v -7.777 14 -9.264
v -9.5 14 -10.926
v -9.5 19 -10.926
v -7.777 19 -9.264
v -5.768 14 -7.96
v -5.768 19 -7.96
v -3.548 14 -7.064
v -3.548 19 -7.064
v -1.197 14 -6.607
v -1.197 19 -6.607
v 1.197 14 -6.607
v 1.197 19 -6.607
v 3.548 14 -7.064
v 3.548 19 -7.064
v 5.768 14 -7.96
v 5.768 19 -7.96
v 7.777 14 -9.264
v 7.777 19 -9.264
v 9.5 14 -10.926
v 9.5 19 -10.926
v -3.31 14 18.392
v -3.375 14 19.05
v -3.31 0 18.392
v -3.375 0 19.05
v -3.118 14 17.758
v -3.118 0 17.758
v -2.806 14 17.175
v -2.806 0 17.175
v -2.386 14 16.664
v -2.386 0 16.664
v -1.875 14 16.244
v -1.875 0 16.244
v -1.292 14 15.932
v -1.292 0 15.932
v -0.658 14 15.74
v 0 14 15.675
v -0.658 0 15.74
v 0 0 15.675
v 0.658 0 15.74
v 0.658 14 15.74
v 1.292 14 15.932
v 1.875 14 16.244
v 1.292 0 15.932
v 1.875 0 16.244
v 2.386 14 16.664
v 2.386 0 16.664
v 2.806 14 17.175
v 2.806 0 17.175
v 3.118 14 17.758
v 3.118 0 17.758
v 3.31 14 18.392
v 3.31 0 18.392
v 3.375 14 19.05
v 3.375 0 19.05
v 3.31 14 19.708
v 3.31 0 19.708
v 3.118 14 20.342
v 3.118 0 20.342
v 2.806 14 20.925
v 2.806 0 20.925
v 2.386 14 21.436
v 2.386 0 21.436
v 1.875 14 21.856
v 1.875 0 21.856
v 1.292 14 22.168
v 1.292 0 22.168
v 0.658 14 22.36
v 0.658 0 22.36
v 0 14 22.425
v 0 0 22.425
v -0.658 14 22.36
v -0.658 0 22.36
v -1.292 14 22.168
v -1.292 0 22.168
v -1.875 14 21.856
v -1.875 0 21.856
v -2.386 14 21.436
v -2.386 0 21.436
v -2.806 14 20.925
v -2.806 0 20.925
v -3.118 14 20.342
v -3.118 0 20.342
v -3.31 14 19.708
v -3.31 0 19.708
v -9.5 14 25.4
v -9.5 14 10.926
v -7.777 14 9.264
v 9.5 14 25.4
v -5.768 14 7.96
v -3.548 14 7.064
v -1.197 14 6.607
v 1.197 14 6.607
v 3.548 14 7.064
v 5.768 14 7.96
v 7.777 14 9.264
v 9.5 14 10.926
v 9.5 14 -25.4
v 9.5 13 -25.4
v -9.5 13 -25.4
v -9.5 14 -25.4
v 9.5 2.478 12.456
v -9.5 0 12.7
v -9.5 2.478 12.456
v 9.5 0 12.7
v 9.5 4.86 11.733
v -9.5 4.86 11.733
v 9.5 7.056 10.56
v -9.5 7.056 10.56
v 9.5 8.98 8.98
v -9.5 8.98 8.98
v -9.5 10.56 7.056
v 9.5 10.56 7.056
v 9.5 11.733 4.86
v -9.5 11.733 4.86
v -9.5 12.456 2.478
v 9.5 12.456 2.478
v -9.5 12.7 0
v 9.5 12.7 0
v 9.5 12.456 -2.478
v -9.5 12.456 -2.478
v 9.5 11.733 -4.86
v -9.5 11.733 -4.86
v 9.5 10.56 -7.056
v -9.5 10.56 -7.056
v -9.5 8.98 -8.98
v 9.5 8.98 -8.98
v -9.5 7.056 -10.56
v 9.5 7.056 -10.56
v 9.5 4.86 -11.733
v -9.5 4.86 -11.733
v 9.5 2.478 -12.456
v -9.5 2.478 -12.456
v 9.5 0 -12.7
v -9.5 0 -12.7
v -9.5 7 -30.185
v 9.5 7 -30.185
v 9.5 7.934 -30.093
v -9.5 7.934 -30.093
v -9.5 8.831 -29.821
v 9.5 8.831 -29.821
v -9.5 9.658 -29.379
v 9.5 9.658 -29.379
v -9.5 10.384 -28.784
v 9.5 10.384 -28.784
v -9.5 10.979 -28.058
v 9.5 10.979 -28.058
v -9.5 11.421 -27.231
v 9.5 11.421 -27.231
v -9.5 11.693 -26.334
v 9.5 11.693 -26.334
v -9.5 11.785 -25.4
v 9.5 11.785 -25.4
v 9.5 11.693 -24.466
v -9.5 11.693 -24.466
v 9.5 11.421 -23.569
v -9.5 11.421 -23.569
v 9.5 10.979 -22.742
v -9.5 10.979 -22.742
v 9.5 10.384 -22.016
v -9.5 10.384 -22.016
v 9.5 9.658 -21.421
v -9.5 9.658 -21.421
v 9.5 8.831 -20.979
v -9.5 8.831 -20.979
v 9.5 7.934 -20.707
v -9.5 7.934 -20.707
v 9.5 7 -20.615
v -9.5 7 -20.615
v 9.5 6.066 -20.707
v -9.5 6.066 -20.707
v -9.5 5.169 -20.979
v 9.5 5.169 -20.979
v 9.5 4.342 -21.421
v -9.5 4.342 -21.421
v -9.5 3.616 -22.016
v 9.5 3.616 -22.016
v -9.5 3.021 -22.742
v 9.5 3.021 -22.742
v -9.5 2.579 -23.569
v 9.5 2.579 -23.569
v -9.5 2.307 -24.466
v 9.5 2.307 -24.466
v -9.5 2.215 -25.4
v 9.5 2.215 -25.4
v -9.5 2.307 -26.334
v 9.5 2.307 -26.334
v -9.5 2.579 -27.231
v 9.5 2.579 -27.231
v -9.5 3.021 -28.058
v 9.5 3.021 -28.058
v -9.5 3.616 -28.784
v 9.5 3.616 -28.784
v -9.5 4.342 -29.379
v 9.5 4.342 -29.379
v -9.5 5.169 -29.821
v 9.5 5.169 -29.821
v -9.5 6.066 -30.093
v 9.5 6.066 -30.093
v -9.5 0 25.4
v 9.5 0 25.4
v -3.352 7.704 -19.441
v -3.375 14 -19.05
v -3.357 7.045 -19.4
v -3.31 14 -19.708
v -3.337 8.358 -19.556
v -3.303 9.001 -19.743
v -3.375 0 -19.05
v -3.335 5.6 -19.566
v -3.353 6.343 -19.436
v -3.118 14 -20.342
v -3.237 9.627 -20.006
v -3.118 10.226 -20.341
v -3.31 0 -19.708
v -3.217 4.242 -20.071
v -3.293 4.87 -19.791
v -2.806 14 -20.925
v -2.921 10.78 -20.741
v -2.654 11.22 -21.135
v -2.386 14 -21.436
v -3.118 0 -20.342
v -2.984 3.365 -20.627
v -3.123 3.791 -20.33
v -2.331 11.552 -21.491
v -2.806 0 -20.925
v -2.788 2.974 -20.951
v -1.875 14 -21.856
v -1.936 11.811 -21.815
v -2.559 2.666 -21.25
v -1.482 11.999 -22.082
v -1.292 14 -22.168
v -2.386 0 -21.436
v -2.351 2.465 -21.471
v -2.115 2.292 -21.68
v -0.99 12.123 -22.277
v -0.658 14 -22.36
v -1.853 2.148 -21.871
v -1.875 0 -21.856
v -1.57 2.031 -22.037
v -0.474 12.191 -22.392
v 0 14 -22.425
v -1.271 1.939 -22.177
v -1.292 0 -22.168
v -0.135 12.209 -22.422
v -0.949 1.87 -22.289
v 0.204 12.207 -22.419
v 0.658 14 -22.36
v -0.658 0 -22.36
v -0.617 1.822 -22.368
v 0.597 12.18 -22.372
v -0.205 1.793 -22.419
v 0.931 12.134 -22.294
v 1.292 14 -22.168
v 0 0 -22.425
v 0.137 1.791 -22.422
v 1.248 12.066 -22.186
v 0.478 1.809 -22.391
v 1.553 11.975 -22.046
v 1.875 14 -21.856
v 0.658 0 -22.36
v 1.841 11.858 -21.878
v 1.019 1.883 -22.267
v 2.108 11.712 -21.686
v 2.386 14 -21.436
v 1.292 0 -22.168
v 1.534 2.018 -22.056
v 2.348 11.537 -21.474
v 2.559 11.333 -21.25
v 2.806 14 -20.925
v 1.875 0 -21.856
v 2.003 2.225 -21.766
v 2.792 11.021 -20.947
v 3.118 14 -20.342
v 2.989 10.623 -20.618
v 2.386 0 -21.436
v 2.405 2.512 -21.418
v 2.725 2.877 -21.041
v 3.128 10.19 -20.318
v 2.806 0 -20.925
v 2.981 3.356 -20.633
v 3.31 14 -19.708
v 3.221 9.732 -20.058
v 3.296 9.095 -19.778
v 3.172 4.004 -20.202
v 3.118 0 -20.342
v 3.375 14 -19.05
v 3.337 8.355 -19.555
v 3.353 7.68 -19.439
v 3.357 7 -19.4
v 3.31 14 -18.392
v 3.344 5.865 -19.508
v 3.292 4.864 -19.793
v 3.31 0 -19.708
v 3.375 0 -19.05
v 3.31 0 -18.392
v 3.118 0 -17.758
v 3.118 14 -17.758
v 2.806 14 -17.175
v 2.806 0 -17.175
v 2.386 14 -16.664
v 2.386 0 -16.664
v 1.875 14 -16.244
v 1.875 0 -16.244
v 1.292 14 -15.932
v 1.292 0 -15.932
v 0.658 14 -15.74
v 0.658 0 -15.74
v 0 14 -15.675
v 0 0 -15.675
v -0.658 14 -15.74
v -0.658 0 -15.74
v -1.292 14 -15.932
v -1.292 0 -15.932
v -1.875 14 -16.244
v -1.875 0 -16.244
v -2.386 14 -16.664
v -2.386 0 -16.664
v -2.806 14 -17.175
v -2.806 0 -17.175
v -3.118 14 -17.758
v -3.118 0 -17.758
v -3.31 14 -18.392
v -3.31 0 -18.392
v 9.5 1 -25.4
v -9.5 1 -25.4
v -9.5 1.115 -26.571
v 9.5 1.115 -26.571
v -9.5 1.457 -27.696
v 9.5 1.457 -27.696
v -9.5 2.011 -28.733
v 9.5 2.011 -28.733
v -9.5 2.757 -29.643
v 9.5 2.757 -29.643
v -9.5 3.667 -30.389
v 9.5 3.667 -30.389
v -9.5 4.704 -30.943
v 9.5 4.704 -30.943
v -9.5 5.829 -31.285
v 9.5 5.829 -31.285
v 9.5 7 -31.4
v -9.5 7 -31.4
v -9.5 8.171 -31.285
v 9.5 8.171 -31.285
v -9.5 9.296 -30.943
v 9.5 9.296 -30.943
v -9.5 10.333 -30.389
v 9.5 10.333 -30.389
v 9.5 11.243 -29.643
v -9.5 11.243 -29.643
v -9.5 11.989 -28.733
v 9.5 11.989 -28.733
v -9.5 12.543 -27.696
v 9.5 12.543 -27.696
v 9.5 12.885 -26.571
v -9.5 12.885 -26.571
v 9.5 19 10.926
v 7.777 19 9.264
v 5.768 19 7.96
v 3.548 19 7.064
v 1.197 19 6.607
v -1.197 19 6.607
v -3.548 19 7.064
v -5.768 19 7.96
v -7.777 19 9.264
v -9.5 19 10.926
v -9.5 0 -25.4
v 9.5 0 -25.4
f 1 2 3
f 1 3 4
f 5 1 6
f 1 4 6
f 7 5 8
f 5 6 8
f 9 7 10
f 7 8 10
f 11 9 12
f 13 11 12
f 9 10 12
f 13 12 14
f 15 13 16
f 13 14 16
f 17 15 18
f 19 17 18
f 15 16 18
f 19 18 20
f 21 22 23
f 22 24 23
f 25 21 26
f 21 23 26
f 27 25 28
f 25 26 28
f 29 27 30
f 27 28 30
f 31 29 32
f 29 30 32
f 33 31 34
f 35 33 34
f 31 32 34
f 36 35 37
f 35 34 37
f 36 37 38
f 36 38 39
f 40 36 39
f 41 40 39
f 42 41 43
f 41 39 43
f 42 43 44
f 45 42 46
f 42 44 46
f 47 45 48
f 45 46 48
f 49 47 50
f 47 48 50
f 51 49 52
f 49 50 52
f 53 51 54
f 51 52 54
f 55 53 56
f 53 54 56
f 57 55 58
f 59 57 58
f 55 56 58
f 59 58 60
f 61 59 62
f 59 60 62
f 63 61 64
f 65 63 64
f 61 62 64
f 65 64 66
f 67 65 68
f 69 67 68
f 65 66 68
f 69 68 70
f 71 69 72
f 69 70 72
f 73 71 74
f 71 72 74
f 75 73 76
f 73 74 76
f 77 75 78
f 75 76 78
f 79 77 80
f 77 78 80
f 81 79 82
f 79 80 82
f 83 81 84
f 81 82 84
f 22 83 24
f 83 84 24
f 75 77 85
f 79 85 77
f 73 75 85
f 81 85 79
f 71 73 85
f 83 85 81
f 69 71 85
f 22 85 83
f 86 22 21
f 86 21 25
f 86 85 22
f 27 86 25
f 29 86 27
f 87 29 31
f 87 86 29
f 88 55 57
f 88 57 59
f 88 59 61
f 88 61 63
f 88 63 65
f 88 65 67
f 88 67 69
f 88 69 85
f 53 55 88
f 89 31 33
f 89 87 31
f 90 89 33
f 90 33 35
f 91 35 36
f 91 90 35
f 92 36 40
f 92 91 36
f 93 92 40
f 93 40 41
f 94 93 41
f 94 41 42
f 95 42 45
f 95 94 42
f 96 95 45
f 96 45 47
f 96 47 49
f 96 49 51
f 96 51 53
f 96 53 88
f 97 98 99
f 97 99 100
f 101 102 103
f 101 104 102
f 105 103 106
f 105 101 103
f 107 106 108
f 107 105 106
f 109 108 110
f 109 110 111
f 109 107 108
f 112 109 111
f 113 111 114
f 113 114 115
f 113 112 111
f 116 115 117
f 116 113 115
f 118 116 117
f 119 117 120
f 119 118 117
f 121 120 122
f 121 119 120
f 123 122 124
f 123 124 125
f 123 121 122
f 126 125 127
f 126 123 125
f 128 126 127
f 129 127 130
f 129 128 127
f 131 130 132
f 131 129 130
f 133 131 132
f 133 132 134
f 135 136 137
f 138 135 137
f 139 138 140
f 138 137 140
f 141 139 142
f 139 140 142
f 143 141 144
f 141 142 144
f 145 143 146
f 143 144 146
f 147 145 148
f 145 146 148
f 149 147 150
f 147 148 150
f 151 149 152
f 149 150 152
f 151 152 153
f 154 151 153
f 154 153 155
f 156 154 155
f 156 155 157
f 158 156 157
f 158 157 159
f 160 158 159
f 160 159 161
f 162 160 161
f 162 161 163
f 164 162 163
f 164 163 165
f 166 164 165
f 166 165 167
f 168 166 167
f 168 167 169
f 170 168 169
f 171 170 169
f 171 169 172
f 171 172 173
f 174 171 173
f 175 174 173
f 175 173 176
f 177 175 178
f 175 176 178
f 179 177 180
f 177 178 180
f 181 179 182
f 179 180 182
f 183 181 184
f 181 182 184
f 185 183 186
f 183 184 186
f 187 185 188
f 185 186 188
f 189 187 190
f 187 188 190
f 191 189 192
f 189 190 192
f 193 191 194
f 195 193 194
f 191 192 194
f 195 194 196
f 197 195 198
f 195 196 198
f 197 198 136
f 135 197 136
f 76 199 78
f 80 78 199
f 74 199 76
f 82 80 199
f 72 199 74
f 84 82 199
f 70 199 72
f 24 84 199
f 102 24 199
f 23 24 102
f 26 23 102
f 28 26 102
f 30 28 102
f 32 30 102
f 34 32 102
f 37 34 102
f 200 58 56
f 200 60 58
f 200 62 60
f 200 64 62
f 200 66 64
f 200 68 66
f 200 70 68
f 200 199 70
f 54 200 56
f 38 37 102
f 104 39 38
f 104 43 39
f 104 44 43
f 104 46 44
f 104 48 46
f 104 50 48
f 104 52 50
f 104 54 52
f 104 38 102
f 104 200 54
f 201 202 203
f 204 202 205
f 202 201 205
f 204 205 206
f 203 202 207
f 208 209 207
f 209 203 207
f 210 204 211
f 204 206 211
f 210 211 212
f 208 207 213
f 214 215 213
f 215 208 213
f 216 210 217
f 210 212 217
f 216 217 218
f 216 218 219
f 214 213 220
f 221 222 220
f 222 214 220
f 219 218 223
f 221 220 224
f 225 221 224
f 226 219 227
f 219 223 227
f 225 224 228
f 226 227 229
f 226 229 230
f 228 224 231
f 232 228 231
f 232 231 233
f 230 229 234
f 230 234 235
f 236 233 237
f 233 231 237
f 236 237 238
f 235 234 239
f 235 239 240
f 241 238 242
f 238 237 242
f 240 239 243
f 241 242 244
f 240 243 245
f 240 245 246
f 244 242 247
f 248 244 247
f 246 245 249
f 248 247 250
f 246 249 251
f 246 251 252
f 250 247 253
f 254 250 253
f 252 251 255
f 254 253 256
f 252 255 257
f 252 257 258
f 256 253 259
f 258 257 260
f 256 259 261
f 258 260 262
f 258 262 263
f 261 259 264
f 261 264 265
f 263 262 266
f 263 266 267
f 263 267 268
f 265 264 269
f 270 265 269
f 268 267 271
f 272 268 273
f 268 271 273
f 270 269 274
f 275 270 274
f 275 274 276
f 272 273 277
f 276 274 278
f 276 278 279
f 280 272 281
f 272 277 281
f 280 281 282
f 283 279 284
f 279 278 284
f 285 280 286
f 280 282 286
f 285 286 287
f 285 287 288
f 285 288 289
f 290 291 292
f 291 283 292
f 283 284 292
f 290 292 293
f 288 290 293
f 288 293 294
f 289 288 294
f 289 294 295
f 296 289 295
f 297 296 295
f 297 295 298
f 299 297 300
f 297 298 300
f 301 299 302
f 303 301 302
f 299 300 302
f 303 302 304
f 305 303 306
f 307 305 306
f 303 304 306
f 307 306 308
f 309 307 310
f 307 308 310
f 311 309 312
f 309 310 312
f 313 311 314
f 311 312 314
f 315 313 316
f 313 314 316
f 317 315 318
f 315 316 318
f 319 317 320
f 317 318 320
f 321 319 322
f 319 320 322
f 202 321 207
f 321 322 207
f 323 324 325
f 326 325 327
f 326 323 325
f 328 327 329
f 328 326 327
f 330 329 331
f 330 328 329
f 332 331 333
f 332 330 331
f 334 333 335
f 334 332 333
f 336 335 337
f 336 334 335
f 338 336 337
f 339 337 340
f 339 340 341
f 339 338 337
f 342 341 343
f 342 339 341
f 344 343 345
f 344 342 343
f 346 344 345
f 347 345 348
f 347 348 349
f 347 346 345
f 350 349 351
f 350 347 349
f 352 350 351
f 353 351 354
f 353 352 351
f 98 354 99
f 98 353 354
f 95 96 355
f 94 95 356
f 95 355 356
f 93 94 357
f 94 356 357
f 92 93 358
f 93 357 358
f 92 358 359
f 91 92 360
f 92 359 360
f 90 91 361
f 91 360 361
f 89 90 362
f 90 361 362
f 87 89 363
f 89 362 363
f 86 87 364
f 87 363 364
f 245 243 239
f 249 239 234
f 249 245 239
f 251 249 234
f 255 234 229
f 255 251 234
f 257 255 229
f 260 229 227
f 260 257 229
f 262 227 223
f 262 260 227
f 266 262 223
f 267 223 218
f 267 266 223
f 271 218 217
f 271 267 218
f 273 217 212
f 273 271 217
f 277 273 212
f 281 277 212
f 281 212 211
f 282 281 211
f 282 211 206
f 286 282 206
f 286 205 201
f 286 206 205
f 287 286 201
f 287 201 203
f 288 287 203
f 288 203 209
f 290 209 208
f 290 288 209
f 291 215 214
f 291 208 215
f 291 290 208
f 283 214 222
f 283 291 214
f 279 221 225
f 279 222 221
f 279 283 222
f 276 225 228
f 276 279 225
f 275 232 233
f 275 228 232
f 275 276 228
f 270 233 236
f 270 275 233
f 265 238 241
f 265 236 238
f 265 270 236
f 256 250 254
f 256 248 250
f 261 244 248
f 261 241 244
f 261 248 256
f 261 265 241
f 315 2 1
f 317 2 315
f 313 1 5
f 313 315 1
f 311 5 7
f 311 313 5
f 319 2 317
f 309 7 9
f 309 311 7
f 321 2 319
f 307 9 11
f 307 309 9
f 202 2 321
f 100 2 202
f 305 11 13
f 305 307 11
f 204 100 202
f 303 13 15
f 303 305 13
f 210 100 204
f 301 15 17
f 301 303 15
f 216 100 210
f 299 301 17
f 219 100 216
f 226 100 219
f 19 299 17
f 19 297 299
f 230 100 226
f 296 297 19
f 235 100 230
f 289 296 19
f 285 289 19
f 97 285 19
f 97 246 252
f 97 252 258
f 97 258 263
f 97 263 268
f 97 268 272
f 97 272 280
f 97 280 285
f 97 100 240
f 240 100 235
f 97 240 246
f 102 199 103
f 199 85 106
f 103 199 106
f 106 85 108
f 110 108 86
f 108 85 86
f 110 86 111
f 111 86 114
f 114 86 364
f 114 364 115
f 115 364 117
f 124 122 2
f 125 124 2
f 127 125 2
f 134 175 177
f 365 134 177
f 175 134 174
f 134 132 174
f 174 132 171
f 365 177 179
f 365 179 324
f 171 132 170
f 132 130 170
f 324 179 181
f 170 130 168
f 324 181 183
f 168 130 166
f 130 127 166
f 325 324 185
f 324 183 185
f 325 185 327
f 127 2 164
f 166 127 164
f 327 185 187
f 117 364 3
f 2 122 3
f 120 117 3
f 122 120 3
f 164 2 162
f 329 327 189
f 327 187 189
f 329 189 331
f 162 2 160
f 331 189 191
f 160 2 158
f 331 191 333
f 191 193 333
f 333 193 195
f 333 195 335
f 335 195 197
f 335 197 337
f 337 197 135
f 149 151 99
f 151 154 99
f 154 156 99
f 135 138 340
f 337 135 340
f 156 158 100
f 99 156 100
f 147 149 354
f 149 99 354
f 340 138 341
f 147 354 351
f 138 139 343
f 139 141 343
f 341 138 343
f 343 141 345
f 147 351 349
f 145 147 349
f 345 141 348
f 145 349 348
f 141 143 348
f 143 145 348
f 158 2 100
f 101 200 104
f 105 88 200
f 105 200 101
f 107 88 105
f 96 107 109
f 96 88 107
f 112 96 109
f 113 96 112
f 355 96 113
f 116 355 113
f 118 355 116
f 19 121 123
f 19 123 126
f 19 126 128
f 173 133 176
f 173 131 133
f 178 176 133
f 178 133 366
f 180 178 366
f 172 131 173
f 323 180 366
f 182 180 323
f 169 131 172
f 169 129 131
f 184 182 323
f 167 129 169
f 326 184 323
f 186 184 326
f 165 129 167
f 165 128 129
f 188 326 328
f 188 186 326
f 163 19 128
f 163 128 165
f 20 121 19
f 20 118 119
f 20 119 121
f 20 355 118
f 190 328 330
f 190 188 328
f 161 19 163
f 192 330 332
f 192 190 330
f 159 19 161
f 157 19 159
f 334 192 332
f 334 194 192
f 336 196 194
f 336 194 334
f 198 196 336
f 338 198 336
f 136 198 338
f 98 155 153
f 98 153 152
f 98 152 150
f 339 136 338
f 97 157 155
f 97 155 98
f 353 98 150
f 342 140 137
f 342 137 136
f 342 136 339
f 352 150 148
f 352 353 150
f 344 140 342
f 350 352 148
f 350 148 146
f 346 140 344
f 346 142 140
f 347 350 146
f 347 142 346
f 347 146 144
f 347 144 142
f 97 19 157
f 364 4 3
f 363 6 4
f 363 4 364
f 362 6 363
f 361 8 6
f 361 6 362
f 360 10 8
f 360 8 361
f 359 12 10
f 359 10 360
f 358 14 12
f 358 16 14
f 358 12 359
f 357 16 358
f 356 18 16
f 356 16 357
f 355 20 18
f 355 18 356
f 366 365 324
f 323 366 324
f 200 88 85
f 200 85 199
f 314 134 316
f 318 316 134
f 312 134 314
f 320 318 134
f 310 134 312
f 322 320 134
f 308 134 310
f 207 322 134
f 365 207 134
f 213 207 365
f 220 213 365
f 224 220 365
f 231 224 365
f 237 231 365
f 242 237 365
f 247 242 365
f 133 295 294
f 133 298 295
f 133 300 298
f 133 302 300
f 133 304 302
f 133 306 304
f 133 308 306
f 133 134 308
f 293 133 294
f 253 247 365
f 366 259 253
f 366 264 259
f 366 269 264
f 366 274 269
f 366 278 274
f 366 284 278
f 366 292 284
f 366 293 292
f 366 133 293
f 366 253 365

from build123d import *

# Parameters (mm, degrees)
BOSS_EXTRUDE1_DEPTH                      = 9.5
CBORE_FOR_M12_HEX_HEAD_BOLT3_D           = 6.75
CBORE_FOR_M12_HEX_HEAD_BOLT3_CBORE_D     = 25
CBORE_FOR_M12_HEX_HEAD_BOLT3_CBORE_DEPTH = 5
SKETCH6_R                                = 4.785
CUT_EXTRUDE1_DEPTH                       = 19
SKETCH6_3_R                              = 6
SKETCH6_3_R_2                            = 4.785
BOSS_EXTRUDE2_DEPTH                      = 19


with BuildPart() as part:
    # Sketch1 → Boss-Extrude1 (new, symmetric)
    with BuildSketch(Plane(origin=(0, 0, 0), x_dir=(0, 0, -1), z_dir=(1, 0, 0))):
        with BuildLine():
            Line((12.7, 0), (25.4, 0))
            Line((25.4, 0), (25.4, 19))
            Line((25.4, 19), (-25.4, 19))
            Line((-25.4, 19), (-25.4, 0))
            Line((-25.4, 0), (-12.7, 0))
            ThreePointArc((-12.7, 0), (0, 12.7), (12.7, 0))
        make_face()
    extrude(amount=BOSS_EXTRUDE1_DEPTH, both=True)

    # CBORE for M12 Hex Head Bolt3 (through all)
    with Locations(Plane(origin=(0, 19, 0), x_dir=(1, 0, 0), z_dir=(0, 1, 0))):
        with Locations((0, 19.05), (0, -19.05)):
            CounterBoreHole(CBORE_FOR_M12_HEX_HEAD_BOLT3_D / 2, CBORE_FOR_M12_HEX_HEAD_BOLT3_CBORE_D / 2, CBORE_FOR_M12_HEX_HEAD_BOLT3_CBORE_DEPTH)

    # Sketch6 → Cut-Extrude1 (cut)
    with BuildSketch(Plane(origin=(9.5, 0, 0), x_dir=(0, 0, -1), z_dir=(1, 0, 0))):
        with Locations((25.4, 7)):
            Circle(SKETCH6_R)
    extrude(amount=-CUT_EXTRUDE1_DEPTH, mode=Mode.SUBTRACT)

    # Sketch6<3> → Boss-Extrude2 (add)
    with BuildSketch(Plane(origin=(9.5, 0, 0), x_dir=(0, 0, -1), z_dir=(1, 0, 0))):
        with Locations((25.4, 7)):
            Circle(SKETCH6_3_R)
        with Locations((25.4, 7)):
            Circle(SKETCH6_3_R_2, mode=Mode.SUBTRACT)
    extrude(amount=-BOSS_EXTRUDE2_DEPTH)


solid = part.part
